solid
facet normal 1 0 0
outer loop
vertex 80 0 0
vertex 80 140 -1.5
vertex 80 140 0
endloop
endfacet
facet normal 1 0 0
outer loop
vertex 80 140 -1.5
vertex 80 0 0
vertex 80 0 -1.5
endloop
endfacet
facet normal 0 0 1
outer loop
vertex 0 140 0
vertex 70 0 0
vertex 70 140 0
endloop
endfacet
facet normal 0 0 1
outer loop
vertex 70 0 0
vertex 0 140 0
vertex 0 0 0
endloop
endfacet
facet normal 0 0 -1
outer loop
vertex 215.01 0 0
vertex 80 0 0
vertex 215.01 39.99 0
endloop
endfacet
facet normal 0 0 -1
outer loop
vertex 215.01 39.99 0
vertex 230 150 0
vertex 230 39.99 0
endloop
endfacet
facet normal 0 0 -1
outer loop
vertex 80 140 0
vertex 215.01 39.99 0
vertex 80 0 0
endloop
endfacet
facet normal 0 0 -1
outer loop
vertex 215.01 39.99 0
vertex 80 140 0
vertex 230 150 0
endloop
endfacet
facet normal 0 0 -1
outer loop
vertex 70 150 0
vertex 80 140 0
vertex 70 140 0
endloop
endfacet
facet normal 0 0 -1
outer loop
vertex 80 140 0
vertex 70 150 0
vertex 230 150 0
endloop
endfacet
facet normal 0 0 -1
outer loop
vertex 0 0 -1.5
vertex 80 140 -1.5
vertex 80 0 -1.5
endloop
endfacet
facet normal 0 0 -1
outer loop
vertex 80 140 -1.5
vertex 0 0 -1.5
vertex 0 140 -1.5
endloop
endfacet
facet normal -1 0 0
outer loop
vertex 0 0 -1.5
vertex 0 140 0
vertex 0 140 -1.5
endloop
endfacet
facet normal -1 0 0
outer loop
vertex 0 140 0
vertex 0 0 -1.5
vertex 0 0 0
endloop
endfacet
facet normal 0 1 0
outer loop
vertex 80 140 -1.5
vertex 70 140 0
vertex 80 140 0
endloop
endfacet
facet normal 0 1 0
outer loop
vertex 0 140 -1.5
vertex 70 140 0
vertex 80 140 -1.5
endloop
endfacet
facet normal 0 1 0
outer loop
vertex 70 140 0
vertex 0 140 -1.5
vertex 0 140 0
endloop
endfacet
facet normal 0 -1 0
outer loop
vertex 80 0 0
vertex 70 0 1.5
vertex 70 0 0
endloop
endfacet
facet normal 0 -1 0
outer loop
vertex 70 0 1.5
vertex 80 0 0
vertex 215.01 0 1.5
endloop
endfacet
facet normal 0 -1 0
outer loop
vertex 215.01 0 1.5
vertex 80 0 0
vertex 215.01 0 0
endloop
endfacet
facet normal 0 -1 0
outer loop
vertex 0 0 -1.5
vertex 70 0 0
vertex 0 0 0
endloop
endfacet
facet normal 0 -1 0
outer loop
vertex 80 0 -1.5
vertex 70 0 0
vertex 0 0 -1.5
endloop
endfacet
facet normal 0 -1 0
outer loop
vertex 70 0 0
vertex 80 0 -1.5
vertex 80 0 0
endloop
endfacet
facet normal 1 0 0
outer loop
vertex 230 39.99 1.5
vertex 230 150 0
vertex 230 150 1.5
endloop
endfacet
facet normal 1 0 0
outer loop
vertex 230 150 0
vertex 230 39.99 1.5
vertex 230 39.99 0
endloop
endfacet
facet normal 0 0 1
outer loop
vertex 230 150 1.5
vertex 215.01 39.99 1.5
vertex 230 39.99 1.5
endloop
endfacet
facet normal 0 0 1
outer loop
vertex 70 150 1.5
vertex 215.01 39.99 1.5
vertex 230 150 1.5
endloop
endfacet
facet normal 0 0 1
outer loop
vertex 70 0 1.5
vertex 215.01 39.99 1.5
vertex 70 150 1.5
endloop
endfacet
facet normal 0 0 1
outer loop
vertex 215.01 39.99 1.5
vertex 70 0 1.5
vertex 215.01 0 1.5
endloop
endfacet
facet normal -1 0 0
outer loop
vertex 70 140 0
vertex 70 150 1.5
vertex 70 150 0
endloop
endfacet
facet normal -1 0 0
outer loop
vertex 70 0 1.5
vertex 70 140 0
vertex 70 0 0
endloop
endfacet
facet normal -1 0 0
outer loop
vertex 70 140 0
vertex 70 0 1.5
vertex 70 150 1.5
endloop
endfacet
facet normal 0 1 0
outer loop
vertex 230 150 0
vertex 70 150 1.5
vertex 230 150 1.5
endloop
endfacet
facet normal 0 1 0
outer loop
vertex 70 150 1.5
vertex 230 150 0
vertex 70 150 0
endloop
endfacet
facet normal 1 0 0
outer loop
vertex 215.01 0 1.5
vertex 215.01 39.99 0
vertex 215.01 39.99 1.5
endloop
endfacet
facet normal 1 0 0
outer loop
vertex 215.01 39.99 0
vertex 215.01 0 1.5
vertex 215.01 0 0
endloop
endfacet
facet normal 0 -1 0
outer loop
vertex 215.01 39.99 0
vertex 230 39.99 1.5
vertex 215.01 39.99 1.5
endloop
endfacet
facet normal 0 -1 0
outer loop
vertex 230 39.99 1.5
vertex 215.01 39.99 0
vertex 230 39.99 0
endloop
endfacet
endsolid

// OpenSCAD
// PSU modification model.

$fn = 50;
OX = 0.01;

// PSU modification model.
// @param primary Color of the primary PCB.
// @param secondary Color of the secondary PCB.
module psu_mod(primary = [42/255, 153/255, 85/255],
	secondary = [106/255, 96/255, 84/255]) {
	difference() {
		union() {
			color(secondary) translate([0, 0, -1.5]) cube([80, 140, 1.5]);
			color(primary) translate([70, 0, 0]) cube([160, 150, 1.5]);
		}
		translate([215 + OX, -OX, -OX]) cube([15, 40, 10]);
	}
}

// Example:
psu_mod();
